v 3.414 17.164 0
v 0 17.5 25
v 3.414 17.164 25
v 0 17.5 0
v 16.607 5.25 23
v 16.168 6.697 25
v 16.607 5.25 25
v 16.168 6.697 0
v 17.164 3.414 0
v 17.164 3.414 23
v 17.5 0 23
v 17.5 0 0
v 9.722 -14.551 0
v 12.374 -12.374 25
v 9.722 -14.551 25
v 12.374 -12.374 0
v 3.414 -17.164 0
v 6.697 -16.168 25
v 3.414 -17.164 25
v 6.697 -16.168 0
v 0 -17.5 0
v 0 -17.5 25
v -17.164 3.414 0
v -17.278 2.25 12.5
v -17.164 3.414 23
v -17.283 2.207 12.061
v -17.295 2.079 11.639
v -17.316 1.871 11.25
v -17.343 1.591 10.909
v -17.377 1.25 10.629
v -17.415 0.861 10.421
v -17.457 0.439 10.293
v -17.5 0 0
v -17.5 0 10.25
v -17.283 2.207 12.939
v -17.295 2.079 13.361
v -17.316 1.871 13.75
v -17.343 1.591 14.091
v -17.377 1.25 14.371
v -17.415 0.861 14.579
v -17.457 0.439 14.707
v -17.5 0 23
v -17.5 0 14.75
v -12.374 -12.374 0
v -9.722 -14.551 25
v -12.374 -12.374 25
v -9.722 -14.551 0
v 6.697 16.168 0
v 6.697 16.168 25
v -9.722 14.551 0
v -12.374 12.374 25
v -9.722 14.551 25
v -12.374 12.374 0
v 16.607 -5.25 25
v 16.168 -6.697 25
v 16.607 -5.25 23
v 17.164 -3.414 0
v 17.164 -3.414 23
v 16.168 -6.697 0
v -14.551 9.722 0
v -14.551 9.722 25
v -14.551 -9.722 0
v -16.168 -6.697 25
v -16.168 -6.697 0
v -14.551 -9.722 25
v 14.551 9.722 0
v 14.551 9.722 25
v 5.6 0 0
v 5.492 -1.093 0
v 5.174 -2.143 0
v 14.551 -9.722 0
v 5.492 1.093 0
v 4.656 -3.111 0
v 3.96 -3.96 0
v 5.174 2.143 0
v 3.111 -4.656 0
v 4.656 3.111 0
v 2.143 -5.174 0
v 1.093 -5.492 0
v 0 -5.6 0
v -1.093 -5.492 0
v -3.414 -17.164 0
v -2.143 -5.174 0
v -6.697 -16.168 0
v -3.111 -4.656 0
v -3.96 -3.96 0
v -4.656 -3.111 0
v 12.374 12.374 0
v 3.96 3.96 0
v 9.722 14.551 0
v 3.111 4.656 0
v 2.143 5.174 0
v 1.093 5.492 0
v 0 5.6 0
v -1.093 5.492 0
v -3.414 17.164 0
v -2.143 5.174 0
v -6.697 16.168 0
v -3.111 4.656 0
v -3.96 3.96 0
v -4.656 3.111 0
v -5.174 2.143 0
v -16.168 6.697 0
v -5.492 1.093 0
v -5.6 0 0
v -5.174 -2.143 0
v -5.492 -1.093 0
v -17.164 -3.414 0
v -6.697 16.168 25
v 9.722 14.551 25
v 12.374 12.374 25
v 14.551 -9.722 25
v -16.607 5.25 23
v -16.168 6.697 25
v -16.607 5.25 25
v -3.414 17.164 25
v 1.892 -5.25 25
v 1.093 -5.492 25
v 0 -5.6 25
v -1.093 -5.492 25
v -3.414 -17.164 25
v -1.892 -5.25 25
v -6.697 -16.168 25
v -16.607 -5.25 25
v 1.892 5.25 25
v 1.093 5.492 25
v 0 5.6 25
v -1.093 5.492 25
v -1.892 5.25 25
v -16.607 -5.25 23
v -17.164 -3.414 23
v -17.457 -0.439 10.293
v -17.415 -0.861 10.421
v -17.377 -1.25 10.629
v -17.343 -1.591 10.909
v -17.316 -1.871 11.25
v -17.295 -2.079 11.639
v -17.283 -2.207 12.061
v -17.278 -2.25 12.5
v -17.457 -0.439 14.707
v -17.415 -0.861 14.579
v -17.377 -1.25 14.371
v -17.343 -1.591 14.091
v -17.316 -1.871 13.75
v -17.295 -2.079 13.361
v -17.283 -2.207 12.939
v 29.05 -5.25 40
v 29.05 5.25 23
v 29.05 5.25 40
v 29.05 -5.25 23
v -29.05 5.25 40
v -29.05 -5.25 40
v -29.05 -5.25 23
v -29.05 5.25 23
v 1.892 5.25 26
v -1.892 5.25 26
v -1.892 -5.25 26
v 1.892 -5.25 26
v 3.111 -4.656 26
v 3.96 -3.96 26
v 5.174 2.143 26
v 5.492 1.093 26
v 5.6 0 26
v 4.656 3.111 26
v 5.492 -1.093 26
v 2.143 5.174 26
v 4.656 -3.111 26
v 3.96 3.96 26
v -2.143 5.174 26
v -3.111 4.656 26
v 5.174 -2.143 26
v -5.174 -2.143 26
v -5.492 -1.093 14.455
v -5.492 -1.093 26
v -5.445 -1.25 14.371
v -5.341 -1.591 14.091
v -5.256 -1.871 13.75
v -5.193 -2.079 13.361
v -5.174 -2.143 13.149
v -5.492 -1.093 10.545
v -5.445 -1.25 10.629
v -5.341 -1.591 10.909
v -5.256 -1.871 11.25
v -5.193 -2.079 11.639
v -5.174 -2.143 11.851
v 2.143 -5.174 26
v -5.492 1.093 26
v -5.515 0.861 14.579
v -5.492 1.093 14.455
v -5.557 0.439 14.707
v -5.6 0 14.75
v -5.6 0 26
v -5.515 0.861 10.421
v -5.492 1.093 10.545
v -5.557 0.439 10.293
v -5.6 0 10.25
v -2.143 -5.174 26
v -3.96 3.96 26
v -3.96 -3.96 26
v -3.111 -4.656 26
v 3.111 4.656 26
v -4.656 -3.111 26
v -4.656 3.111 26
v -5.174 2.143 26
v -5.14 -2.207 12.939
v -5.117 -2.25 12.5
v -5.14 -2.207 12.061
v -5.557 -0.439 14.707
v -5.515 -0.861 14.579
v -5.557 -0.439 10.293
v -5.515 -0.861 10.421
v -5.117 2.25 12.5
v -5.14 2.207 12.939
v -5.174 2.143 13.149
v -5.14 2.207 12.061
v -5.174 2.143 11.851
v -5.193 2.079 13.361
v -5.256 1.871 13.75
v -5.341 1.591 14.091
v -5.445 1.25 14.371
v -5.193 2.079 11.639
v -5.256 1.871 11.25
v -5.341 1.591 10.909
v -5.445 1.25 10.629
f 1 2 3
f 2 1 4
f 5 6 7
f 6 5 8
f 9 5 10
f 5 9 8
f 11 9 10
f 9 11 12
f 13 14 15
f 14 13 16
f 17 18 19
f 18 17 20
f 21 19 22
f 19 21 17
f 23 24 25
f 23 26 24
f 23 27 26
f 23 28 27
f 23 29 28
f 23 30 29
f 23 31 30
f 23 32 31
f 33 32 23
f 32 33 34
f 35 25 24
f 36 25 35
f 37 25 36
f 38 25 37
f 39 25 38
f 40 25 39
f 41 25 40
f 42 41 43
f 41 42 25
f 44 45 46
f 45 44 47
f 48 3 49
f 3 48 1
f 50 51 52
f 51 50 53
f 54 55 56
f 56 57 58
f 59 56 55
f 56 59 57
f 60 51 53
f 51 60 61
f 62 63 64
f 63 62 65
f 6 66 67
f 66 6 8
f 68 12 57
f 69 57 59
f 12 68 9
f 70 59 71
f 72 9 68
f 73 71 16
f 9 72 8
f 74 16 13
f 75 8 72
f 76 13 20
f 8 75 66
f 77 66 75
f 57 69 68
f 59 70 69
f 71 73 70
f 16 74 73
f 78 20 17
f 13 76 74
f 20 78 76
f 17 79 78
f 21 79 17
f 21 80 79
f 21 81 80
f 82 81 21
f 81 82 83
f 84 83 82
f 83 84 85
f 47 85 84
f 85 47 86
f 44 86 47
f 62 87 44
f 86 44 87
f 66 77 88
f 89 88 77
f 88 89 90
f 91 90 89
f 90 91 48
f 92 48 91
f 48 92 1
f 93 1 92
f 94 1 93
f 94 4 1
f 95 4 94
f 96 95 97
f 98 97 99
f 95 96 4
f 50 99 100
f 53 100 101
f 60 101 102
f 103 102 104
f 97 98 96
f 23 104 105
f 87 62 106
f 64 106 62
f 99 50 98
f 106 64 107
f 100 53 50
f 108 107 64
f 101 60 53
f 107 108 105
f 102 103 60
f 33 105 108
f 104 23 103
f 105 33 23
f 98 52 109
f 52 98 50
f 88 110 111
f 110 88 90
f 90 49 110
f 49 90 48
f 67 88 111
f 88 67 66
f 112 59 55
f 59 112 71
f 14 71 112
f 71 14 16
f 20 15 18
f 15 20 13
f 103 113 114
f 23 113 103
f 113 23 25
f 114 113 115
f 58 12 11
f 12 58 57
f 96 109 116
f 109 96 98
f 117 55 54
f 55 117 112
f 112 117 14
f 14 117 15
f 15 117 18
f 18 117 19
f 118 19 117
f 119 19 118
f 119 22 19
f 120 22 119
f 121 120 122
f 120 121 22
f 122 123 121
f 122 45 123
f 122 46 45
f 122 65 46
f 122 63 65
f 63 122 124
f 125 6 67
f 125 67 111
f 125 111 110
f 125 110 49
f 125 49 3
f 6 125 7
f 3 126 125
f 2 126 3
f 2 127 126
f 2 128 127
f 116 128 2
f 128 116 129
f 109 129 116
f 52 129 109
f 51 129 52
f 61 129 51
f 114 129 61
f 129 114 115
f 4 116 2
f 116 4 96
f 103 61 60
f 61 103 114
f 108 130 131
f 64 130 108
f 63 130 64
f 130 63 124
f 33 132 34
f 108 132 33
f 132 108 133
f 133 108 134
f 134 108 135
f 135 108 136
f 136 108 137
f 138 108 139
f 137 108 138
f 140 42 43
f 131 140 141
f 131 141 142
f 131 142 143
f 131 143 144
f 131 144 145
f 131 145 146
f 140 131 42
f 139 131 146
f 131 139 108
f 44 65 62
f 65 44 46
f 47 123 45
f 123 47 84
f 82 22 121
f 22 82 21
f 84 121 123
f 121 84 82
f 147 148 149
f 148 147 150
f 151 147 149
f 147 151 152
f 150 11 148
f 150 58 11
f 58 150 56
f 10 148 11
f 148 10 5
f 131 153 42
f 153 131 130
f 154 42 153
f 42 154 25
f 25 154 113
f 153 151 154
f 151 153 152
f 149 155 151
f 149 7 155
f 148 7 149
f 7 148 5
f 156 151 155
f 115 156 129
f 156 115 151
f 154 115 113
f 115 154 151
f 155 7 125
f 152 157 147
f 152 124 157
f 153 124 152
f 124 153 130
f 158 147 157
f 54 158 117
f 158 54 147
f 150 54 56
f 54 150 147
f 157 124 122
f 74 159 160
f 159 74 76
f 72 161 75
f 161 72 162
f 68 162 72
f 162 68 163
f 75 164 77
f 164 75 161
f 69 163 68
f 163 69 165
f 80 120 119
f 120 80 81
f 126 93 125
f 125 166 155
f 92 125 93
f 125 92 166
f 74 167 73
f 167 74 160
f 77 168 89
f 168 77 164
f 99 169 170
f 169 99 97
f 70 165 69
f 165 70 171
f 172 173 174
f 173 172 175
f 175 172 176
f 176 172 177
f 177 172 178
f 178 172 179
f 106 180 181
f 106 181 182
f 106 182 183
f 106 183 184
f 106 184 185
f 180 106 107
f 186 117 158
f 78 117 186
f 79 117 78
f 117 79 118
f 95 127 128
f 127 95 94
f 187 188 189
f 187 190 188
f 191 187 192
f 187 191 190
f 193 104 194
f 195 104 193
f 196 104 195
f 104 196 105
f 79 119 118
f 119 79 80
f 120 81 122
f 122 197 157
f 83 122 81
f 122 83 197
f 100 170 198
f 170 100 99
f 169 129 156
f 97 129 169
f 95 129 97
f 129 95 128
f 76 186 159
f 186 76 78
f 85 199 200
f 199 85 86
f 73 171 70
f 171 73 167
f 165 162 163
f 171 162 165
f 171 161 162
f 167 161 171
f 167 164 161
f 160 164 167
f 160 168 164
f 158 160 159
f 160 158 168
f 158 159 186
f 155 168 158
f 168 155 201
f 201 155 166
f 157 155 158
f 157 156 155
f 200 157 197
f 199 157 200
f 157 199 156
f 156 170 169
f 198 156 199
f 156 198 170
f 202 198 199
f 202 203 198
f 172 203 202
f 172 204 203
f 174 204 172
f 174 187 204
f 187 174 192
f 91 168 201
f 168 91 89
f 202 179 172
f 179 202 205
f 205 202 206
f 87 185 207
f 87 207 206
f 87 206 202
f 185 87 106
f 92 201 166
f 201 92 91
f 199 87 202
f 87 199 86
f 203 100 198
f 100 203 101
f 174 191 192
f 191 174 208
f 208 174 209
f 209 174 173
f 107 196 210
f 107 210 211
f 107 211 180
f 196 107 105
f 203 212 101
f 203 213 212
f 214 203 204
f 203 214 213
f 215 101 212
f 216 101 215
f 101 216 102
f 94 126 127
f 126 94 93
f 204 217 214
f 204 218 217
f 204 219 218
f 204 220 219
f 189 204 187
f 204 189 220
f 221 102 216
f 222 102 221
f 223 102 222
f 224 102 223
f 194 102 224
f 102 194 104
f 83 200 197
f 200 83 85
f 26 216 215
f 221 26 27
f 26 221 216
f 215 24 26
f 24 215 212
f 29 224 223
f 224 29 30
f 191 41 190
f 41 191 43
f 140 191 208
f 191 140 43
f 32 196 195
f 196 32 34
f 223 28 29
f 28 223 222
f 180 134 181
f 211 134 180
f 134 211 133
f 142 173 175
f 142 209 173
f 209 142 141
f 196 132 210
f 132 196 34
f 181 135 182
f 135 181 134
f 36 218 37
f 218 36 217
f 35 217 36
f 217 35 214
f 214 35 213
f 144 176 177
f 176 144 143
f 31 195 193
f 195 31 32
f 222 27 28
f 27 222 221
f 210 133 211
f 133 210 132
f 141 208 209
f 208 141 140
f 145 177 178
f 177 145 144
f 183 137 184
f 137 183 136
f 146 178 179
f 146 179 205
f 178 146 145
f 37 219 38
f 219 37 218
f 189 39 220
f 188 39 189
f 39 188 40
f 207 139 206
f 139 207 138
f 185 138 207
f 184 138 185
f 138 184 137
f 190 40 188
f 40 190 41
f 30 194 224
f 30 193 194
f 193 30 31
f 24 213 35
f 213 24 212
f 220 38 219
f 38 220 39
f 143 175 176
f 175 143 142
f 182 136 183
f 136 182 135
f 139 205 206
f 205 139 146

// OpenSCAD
$fn = 32;
// ----------------------------------------------------------------------
// Hand knob: 35 x 58.1 x 25 mm
// ----------------------------------------------------------------------

// --- parameters (mm) ---
grip_d = 35;              // knob diameter
grip_h = 25;              // knob height
shaft_d = 11.2;           // shaft bore
set_d = 4.5;              // set screw tap hole
wing_l = 58.1;            // wing span
wing_w = 10.5;            // wing width
wing_h = 15;              // wing thickness

module body() {
  cylinder(h = grip_h, d = grip_d);
}

module wing() {
  /* wing sunk 2 mm into the knob so the joint overlaps */
  translate([-wing_l / 2, -wing_w / 2, grip_h - 2])
    cube([wing_l, wing_w, wing_h + 2]);
}

difference() {
  union() {
    body();
    wing();
  }
  translate([0, 0, -1]) cylinder(h = grip_h + 0 + 2, d = shaft_d);
  translate([-grip_d / 2 - 1, 0, grip_h * 0.5]) rotate([0, 90, 0]) cylinder(h = grip_d / 2 + 2, d = set_d);
}
